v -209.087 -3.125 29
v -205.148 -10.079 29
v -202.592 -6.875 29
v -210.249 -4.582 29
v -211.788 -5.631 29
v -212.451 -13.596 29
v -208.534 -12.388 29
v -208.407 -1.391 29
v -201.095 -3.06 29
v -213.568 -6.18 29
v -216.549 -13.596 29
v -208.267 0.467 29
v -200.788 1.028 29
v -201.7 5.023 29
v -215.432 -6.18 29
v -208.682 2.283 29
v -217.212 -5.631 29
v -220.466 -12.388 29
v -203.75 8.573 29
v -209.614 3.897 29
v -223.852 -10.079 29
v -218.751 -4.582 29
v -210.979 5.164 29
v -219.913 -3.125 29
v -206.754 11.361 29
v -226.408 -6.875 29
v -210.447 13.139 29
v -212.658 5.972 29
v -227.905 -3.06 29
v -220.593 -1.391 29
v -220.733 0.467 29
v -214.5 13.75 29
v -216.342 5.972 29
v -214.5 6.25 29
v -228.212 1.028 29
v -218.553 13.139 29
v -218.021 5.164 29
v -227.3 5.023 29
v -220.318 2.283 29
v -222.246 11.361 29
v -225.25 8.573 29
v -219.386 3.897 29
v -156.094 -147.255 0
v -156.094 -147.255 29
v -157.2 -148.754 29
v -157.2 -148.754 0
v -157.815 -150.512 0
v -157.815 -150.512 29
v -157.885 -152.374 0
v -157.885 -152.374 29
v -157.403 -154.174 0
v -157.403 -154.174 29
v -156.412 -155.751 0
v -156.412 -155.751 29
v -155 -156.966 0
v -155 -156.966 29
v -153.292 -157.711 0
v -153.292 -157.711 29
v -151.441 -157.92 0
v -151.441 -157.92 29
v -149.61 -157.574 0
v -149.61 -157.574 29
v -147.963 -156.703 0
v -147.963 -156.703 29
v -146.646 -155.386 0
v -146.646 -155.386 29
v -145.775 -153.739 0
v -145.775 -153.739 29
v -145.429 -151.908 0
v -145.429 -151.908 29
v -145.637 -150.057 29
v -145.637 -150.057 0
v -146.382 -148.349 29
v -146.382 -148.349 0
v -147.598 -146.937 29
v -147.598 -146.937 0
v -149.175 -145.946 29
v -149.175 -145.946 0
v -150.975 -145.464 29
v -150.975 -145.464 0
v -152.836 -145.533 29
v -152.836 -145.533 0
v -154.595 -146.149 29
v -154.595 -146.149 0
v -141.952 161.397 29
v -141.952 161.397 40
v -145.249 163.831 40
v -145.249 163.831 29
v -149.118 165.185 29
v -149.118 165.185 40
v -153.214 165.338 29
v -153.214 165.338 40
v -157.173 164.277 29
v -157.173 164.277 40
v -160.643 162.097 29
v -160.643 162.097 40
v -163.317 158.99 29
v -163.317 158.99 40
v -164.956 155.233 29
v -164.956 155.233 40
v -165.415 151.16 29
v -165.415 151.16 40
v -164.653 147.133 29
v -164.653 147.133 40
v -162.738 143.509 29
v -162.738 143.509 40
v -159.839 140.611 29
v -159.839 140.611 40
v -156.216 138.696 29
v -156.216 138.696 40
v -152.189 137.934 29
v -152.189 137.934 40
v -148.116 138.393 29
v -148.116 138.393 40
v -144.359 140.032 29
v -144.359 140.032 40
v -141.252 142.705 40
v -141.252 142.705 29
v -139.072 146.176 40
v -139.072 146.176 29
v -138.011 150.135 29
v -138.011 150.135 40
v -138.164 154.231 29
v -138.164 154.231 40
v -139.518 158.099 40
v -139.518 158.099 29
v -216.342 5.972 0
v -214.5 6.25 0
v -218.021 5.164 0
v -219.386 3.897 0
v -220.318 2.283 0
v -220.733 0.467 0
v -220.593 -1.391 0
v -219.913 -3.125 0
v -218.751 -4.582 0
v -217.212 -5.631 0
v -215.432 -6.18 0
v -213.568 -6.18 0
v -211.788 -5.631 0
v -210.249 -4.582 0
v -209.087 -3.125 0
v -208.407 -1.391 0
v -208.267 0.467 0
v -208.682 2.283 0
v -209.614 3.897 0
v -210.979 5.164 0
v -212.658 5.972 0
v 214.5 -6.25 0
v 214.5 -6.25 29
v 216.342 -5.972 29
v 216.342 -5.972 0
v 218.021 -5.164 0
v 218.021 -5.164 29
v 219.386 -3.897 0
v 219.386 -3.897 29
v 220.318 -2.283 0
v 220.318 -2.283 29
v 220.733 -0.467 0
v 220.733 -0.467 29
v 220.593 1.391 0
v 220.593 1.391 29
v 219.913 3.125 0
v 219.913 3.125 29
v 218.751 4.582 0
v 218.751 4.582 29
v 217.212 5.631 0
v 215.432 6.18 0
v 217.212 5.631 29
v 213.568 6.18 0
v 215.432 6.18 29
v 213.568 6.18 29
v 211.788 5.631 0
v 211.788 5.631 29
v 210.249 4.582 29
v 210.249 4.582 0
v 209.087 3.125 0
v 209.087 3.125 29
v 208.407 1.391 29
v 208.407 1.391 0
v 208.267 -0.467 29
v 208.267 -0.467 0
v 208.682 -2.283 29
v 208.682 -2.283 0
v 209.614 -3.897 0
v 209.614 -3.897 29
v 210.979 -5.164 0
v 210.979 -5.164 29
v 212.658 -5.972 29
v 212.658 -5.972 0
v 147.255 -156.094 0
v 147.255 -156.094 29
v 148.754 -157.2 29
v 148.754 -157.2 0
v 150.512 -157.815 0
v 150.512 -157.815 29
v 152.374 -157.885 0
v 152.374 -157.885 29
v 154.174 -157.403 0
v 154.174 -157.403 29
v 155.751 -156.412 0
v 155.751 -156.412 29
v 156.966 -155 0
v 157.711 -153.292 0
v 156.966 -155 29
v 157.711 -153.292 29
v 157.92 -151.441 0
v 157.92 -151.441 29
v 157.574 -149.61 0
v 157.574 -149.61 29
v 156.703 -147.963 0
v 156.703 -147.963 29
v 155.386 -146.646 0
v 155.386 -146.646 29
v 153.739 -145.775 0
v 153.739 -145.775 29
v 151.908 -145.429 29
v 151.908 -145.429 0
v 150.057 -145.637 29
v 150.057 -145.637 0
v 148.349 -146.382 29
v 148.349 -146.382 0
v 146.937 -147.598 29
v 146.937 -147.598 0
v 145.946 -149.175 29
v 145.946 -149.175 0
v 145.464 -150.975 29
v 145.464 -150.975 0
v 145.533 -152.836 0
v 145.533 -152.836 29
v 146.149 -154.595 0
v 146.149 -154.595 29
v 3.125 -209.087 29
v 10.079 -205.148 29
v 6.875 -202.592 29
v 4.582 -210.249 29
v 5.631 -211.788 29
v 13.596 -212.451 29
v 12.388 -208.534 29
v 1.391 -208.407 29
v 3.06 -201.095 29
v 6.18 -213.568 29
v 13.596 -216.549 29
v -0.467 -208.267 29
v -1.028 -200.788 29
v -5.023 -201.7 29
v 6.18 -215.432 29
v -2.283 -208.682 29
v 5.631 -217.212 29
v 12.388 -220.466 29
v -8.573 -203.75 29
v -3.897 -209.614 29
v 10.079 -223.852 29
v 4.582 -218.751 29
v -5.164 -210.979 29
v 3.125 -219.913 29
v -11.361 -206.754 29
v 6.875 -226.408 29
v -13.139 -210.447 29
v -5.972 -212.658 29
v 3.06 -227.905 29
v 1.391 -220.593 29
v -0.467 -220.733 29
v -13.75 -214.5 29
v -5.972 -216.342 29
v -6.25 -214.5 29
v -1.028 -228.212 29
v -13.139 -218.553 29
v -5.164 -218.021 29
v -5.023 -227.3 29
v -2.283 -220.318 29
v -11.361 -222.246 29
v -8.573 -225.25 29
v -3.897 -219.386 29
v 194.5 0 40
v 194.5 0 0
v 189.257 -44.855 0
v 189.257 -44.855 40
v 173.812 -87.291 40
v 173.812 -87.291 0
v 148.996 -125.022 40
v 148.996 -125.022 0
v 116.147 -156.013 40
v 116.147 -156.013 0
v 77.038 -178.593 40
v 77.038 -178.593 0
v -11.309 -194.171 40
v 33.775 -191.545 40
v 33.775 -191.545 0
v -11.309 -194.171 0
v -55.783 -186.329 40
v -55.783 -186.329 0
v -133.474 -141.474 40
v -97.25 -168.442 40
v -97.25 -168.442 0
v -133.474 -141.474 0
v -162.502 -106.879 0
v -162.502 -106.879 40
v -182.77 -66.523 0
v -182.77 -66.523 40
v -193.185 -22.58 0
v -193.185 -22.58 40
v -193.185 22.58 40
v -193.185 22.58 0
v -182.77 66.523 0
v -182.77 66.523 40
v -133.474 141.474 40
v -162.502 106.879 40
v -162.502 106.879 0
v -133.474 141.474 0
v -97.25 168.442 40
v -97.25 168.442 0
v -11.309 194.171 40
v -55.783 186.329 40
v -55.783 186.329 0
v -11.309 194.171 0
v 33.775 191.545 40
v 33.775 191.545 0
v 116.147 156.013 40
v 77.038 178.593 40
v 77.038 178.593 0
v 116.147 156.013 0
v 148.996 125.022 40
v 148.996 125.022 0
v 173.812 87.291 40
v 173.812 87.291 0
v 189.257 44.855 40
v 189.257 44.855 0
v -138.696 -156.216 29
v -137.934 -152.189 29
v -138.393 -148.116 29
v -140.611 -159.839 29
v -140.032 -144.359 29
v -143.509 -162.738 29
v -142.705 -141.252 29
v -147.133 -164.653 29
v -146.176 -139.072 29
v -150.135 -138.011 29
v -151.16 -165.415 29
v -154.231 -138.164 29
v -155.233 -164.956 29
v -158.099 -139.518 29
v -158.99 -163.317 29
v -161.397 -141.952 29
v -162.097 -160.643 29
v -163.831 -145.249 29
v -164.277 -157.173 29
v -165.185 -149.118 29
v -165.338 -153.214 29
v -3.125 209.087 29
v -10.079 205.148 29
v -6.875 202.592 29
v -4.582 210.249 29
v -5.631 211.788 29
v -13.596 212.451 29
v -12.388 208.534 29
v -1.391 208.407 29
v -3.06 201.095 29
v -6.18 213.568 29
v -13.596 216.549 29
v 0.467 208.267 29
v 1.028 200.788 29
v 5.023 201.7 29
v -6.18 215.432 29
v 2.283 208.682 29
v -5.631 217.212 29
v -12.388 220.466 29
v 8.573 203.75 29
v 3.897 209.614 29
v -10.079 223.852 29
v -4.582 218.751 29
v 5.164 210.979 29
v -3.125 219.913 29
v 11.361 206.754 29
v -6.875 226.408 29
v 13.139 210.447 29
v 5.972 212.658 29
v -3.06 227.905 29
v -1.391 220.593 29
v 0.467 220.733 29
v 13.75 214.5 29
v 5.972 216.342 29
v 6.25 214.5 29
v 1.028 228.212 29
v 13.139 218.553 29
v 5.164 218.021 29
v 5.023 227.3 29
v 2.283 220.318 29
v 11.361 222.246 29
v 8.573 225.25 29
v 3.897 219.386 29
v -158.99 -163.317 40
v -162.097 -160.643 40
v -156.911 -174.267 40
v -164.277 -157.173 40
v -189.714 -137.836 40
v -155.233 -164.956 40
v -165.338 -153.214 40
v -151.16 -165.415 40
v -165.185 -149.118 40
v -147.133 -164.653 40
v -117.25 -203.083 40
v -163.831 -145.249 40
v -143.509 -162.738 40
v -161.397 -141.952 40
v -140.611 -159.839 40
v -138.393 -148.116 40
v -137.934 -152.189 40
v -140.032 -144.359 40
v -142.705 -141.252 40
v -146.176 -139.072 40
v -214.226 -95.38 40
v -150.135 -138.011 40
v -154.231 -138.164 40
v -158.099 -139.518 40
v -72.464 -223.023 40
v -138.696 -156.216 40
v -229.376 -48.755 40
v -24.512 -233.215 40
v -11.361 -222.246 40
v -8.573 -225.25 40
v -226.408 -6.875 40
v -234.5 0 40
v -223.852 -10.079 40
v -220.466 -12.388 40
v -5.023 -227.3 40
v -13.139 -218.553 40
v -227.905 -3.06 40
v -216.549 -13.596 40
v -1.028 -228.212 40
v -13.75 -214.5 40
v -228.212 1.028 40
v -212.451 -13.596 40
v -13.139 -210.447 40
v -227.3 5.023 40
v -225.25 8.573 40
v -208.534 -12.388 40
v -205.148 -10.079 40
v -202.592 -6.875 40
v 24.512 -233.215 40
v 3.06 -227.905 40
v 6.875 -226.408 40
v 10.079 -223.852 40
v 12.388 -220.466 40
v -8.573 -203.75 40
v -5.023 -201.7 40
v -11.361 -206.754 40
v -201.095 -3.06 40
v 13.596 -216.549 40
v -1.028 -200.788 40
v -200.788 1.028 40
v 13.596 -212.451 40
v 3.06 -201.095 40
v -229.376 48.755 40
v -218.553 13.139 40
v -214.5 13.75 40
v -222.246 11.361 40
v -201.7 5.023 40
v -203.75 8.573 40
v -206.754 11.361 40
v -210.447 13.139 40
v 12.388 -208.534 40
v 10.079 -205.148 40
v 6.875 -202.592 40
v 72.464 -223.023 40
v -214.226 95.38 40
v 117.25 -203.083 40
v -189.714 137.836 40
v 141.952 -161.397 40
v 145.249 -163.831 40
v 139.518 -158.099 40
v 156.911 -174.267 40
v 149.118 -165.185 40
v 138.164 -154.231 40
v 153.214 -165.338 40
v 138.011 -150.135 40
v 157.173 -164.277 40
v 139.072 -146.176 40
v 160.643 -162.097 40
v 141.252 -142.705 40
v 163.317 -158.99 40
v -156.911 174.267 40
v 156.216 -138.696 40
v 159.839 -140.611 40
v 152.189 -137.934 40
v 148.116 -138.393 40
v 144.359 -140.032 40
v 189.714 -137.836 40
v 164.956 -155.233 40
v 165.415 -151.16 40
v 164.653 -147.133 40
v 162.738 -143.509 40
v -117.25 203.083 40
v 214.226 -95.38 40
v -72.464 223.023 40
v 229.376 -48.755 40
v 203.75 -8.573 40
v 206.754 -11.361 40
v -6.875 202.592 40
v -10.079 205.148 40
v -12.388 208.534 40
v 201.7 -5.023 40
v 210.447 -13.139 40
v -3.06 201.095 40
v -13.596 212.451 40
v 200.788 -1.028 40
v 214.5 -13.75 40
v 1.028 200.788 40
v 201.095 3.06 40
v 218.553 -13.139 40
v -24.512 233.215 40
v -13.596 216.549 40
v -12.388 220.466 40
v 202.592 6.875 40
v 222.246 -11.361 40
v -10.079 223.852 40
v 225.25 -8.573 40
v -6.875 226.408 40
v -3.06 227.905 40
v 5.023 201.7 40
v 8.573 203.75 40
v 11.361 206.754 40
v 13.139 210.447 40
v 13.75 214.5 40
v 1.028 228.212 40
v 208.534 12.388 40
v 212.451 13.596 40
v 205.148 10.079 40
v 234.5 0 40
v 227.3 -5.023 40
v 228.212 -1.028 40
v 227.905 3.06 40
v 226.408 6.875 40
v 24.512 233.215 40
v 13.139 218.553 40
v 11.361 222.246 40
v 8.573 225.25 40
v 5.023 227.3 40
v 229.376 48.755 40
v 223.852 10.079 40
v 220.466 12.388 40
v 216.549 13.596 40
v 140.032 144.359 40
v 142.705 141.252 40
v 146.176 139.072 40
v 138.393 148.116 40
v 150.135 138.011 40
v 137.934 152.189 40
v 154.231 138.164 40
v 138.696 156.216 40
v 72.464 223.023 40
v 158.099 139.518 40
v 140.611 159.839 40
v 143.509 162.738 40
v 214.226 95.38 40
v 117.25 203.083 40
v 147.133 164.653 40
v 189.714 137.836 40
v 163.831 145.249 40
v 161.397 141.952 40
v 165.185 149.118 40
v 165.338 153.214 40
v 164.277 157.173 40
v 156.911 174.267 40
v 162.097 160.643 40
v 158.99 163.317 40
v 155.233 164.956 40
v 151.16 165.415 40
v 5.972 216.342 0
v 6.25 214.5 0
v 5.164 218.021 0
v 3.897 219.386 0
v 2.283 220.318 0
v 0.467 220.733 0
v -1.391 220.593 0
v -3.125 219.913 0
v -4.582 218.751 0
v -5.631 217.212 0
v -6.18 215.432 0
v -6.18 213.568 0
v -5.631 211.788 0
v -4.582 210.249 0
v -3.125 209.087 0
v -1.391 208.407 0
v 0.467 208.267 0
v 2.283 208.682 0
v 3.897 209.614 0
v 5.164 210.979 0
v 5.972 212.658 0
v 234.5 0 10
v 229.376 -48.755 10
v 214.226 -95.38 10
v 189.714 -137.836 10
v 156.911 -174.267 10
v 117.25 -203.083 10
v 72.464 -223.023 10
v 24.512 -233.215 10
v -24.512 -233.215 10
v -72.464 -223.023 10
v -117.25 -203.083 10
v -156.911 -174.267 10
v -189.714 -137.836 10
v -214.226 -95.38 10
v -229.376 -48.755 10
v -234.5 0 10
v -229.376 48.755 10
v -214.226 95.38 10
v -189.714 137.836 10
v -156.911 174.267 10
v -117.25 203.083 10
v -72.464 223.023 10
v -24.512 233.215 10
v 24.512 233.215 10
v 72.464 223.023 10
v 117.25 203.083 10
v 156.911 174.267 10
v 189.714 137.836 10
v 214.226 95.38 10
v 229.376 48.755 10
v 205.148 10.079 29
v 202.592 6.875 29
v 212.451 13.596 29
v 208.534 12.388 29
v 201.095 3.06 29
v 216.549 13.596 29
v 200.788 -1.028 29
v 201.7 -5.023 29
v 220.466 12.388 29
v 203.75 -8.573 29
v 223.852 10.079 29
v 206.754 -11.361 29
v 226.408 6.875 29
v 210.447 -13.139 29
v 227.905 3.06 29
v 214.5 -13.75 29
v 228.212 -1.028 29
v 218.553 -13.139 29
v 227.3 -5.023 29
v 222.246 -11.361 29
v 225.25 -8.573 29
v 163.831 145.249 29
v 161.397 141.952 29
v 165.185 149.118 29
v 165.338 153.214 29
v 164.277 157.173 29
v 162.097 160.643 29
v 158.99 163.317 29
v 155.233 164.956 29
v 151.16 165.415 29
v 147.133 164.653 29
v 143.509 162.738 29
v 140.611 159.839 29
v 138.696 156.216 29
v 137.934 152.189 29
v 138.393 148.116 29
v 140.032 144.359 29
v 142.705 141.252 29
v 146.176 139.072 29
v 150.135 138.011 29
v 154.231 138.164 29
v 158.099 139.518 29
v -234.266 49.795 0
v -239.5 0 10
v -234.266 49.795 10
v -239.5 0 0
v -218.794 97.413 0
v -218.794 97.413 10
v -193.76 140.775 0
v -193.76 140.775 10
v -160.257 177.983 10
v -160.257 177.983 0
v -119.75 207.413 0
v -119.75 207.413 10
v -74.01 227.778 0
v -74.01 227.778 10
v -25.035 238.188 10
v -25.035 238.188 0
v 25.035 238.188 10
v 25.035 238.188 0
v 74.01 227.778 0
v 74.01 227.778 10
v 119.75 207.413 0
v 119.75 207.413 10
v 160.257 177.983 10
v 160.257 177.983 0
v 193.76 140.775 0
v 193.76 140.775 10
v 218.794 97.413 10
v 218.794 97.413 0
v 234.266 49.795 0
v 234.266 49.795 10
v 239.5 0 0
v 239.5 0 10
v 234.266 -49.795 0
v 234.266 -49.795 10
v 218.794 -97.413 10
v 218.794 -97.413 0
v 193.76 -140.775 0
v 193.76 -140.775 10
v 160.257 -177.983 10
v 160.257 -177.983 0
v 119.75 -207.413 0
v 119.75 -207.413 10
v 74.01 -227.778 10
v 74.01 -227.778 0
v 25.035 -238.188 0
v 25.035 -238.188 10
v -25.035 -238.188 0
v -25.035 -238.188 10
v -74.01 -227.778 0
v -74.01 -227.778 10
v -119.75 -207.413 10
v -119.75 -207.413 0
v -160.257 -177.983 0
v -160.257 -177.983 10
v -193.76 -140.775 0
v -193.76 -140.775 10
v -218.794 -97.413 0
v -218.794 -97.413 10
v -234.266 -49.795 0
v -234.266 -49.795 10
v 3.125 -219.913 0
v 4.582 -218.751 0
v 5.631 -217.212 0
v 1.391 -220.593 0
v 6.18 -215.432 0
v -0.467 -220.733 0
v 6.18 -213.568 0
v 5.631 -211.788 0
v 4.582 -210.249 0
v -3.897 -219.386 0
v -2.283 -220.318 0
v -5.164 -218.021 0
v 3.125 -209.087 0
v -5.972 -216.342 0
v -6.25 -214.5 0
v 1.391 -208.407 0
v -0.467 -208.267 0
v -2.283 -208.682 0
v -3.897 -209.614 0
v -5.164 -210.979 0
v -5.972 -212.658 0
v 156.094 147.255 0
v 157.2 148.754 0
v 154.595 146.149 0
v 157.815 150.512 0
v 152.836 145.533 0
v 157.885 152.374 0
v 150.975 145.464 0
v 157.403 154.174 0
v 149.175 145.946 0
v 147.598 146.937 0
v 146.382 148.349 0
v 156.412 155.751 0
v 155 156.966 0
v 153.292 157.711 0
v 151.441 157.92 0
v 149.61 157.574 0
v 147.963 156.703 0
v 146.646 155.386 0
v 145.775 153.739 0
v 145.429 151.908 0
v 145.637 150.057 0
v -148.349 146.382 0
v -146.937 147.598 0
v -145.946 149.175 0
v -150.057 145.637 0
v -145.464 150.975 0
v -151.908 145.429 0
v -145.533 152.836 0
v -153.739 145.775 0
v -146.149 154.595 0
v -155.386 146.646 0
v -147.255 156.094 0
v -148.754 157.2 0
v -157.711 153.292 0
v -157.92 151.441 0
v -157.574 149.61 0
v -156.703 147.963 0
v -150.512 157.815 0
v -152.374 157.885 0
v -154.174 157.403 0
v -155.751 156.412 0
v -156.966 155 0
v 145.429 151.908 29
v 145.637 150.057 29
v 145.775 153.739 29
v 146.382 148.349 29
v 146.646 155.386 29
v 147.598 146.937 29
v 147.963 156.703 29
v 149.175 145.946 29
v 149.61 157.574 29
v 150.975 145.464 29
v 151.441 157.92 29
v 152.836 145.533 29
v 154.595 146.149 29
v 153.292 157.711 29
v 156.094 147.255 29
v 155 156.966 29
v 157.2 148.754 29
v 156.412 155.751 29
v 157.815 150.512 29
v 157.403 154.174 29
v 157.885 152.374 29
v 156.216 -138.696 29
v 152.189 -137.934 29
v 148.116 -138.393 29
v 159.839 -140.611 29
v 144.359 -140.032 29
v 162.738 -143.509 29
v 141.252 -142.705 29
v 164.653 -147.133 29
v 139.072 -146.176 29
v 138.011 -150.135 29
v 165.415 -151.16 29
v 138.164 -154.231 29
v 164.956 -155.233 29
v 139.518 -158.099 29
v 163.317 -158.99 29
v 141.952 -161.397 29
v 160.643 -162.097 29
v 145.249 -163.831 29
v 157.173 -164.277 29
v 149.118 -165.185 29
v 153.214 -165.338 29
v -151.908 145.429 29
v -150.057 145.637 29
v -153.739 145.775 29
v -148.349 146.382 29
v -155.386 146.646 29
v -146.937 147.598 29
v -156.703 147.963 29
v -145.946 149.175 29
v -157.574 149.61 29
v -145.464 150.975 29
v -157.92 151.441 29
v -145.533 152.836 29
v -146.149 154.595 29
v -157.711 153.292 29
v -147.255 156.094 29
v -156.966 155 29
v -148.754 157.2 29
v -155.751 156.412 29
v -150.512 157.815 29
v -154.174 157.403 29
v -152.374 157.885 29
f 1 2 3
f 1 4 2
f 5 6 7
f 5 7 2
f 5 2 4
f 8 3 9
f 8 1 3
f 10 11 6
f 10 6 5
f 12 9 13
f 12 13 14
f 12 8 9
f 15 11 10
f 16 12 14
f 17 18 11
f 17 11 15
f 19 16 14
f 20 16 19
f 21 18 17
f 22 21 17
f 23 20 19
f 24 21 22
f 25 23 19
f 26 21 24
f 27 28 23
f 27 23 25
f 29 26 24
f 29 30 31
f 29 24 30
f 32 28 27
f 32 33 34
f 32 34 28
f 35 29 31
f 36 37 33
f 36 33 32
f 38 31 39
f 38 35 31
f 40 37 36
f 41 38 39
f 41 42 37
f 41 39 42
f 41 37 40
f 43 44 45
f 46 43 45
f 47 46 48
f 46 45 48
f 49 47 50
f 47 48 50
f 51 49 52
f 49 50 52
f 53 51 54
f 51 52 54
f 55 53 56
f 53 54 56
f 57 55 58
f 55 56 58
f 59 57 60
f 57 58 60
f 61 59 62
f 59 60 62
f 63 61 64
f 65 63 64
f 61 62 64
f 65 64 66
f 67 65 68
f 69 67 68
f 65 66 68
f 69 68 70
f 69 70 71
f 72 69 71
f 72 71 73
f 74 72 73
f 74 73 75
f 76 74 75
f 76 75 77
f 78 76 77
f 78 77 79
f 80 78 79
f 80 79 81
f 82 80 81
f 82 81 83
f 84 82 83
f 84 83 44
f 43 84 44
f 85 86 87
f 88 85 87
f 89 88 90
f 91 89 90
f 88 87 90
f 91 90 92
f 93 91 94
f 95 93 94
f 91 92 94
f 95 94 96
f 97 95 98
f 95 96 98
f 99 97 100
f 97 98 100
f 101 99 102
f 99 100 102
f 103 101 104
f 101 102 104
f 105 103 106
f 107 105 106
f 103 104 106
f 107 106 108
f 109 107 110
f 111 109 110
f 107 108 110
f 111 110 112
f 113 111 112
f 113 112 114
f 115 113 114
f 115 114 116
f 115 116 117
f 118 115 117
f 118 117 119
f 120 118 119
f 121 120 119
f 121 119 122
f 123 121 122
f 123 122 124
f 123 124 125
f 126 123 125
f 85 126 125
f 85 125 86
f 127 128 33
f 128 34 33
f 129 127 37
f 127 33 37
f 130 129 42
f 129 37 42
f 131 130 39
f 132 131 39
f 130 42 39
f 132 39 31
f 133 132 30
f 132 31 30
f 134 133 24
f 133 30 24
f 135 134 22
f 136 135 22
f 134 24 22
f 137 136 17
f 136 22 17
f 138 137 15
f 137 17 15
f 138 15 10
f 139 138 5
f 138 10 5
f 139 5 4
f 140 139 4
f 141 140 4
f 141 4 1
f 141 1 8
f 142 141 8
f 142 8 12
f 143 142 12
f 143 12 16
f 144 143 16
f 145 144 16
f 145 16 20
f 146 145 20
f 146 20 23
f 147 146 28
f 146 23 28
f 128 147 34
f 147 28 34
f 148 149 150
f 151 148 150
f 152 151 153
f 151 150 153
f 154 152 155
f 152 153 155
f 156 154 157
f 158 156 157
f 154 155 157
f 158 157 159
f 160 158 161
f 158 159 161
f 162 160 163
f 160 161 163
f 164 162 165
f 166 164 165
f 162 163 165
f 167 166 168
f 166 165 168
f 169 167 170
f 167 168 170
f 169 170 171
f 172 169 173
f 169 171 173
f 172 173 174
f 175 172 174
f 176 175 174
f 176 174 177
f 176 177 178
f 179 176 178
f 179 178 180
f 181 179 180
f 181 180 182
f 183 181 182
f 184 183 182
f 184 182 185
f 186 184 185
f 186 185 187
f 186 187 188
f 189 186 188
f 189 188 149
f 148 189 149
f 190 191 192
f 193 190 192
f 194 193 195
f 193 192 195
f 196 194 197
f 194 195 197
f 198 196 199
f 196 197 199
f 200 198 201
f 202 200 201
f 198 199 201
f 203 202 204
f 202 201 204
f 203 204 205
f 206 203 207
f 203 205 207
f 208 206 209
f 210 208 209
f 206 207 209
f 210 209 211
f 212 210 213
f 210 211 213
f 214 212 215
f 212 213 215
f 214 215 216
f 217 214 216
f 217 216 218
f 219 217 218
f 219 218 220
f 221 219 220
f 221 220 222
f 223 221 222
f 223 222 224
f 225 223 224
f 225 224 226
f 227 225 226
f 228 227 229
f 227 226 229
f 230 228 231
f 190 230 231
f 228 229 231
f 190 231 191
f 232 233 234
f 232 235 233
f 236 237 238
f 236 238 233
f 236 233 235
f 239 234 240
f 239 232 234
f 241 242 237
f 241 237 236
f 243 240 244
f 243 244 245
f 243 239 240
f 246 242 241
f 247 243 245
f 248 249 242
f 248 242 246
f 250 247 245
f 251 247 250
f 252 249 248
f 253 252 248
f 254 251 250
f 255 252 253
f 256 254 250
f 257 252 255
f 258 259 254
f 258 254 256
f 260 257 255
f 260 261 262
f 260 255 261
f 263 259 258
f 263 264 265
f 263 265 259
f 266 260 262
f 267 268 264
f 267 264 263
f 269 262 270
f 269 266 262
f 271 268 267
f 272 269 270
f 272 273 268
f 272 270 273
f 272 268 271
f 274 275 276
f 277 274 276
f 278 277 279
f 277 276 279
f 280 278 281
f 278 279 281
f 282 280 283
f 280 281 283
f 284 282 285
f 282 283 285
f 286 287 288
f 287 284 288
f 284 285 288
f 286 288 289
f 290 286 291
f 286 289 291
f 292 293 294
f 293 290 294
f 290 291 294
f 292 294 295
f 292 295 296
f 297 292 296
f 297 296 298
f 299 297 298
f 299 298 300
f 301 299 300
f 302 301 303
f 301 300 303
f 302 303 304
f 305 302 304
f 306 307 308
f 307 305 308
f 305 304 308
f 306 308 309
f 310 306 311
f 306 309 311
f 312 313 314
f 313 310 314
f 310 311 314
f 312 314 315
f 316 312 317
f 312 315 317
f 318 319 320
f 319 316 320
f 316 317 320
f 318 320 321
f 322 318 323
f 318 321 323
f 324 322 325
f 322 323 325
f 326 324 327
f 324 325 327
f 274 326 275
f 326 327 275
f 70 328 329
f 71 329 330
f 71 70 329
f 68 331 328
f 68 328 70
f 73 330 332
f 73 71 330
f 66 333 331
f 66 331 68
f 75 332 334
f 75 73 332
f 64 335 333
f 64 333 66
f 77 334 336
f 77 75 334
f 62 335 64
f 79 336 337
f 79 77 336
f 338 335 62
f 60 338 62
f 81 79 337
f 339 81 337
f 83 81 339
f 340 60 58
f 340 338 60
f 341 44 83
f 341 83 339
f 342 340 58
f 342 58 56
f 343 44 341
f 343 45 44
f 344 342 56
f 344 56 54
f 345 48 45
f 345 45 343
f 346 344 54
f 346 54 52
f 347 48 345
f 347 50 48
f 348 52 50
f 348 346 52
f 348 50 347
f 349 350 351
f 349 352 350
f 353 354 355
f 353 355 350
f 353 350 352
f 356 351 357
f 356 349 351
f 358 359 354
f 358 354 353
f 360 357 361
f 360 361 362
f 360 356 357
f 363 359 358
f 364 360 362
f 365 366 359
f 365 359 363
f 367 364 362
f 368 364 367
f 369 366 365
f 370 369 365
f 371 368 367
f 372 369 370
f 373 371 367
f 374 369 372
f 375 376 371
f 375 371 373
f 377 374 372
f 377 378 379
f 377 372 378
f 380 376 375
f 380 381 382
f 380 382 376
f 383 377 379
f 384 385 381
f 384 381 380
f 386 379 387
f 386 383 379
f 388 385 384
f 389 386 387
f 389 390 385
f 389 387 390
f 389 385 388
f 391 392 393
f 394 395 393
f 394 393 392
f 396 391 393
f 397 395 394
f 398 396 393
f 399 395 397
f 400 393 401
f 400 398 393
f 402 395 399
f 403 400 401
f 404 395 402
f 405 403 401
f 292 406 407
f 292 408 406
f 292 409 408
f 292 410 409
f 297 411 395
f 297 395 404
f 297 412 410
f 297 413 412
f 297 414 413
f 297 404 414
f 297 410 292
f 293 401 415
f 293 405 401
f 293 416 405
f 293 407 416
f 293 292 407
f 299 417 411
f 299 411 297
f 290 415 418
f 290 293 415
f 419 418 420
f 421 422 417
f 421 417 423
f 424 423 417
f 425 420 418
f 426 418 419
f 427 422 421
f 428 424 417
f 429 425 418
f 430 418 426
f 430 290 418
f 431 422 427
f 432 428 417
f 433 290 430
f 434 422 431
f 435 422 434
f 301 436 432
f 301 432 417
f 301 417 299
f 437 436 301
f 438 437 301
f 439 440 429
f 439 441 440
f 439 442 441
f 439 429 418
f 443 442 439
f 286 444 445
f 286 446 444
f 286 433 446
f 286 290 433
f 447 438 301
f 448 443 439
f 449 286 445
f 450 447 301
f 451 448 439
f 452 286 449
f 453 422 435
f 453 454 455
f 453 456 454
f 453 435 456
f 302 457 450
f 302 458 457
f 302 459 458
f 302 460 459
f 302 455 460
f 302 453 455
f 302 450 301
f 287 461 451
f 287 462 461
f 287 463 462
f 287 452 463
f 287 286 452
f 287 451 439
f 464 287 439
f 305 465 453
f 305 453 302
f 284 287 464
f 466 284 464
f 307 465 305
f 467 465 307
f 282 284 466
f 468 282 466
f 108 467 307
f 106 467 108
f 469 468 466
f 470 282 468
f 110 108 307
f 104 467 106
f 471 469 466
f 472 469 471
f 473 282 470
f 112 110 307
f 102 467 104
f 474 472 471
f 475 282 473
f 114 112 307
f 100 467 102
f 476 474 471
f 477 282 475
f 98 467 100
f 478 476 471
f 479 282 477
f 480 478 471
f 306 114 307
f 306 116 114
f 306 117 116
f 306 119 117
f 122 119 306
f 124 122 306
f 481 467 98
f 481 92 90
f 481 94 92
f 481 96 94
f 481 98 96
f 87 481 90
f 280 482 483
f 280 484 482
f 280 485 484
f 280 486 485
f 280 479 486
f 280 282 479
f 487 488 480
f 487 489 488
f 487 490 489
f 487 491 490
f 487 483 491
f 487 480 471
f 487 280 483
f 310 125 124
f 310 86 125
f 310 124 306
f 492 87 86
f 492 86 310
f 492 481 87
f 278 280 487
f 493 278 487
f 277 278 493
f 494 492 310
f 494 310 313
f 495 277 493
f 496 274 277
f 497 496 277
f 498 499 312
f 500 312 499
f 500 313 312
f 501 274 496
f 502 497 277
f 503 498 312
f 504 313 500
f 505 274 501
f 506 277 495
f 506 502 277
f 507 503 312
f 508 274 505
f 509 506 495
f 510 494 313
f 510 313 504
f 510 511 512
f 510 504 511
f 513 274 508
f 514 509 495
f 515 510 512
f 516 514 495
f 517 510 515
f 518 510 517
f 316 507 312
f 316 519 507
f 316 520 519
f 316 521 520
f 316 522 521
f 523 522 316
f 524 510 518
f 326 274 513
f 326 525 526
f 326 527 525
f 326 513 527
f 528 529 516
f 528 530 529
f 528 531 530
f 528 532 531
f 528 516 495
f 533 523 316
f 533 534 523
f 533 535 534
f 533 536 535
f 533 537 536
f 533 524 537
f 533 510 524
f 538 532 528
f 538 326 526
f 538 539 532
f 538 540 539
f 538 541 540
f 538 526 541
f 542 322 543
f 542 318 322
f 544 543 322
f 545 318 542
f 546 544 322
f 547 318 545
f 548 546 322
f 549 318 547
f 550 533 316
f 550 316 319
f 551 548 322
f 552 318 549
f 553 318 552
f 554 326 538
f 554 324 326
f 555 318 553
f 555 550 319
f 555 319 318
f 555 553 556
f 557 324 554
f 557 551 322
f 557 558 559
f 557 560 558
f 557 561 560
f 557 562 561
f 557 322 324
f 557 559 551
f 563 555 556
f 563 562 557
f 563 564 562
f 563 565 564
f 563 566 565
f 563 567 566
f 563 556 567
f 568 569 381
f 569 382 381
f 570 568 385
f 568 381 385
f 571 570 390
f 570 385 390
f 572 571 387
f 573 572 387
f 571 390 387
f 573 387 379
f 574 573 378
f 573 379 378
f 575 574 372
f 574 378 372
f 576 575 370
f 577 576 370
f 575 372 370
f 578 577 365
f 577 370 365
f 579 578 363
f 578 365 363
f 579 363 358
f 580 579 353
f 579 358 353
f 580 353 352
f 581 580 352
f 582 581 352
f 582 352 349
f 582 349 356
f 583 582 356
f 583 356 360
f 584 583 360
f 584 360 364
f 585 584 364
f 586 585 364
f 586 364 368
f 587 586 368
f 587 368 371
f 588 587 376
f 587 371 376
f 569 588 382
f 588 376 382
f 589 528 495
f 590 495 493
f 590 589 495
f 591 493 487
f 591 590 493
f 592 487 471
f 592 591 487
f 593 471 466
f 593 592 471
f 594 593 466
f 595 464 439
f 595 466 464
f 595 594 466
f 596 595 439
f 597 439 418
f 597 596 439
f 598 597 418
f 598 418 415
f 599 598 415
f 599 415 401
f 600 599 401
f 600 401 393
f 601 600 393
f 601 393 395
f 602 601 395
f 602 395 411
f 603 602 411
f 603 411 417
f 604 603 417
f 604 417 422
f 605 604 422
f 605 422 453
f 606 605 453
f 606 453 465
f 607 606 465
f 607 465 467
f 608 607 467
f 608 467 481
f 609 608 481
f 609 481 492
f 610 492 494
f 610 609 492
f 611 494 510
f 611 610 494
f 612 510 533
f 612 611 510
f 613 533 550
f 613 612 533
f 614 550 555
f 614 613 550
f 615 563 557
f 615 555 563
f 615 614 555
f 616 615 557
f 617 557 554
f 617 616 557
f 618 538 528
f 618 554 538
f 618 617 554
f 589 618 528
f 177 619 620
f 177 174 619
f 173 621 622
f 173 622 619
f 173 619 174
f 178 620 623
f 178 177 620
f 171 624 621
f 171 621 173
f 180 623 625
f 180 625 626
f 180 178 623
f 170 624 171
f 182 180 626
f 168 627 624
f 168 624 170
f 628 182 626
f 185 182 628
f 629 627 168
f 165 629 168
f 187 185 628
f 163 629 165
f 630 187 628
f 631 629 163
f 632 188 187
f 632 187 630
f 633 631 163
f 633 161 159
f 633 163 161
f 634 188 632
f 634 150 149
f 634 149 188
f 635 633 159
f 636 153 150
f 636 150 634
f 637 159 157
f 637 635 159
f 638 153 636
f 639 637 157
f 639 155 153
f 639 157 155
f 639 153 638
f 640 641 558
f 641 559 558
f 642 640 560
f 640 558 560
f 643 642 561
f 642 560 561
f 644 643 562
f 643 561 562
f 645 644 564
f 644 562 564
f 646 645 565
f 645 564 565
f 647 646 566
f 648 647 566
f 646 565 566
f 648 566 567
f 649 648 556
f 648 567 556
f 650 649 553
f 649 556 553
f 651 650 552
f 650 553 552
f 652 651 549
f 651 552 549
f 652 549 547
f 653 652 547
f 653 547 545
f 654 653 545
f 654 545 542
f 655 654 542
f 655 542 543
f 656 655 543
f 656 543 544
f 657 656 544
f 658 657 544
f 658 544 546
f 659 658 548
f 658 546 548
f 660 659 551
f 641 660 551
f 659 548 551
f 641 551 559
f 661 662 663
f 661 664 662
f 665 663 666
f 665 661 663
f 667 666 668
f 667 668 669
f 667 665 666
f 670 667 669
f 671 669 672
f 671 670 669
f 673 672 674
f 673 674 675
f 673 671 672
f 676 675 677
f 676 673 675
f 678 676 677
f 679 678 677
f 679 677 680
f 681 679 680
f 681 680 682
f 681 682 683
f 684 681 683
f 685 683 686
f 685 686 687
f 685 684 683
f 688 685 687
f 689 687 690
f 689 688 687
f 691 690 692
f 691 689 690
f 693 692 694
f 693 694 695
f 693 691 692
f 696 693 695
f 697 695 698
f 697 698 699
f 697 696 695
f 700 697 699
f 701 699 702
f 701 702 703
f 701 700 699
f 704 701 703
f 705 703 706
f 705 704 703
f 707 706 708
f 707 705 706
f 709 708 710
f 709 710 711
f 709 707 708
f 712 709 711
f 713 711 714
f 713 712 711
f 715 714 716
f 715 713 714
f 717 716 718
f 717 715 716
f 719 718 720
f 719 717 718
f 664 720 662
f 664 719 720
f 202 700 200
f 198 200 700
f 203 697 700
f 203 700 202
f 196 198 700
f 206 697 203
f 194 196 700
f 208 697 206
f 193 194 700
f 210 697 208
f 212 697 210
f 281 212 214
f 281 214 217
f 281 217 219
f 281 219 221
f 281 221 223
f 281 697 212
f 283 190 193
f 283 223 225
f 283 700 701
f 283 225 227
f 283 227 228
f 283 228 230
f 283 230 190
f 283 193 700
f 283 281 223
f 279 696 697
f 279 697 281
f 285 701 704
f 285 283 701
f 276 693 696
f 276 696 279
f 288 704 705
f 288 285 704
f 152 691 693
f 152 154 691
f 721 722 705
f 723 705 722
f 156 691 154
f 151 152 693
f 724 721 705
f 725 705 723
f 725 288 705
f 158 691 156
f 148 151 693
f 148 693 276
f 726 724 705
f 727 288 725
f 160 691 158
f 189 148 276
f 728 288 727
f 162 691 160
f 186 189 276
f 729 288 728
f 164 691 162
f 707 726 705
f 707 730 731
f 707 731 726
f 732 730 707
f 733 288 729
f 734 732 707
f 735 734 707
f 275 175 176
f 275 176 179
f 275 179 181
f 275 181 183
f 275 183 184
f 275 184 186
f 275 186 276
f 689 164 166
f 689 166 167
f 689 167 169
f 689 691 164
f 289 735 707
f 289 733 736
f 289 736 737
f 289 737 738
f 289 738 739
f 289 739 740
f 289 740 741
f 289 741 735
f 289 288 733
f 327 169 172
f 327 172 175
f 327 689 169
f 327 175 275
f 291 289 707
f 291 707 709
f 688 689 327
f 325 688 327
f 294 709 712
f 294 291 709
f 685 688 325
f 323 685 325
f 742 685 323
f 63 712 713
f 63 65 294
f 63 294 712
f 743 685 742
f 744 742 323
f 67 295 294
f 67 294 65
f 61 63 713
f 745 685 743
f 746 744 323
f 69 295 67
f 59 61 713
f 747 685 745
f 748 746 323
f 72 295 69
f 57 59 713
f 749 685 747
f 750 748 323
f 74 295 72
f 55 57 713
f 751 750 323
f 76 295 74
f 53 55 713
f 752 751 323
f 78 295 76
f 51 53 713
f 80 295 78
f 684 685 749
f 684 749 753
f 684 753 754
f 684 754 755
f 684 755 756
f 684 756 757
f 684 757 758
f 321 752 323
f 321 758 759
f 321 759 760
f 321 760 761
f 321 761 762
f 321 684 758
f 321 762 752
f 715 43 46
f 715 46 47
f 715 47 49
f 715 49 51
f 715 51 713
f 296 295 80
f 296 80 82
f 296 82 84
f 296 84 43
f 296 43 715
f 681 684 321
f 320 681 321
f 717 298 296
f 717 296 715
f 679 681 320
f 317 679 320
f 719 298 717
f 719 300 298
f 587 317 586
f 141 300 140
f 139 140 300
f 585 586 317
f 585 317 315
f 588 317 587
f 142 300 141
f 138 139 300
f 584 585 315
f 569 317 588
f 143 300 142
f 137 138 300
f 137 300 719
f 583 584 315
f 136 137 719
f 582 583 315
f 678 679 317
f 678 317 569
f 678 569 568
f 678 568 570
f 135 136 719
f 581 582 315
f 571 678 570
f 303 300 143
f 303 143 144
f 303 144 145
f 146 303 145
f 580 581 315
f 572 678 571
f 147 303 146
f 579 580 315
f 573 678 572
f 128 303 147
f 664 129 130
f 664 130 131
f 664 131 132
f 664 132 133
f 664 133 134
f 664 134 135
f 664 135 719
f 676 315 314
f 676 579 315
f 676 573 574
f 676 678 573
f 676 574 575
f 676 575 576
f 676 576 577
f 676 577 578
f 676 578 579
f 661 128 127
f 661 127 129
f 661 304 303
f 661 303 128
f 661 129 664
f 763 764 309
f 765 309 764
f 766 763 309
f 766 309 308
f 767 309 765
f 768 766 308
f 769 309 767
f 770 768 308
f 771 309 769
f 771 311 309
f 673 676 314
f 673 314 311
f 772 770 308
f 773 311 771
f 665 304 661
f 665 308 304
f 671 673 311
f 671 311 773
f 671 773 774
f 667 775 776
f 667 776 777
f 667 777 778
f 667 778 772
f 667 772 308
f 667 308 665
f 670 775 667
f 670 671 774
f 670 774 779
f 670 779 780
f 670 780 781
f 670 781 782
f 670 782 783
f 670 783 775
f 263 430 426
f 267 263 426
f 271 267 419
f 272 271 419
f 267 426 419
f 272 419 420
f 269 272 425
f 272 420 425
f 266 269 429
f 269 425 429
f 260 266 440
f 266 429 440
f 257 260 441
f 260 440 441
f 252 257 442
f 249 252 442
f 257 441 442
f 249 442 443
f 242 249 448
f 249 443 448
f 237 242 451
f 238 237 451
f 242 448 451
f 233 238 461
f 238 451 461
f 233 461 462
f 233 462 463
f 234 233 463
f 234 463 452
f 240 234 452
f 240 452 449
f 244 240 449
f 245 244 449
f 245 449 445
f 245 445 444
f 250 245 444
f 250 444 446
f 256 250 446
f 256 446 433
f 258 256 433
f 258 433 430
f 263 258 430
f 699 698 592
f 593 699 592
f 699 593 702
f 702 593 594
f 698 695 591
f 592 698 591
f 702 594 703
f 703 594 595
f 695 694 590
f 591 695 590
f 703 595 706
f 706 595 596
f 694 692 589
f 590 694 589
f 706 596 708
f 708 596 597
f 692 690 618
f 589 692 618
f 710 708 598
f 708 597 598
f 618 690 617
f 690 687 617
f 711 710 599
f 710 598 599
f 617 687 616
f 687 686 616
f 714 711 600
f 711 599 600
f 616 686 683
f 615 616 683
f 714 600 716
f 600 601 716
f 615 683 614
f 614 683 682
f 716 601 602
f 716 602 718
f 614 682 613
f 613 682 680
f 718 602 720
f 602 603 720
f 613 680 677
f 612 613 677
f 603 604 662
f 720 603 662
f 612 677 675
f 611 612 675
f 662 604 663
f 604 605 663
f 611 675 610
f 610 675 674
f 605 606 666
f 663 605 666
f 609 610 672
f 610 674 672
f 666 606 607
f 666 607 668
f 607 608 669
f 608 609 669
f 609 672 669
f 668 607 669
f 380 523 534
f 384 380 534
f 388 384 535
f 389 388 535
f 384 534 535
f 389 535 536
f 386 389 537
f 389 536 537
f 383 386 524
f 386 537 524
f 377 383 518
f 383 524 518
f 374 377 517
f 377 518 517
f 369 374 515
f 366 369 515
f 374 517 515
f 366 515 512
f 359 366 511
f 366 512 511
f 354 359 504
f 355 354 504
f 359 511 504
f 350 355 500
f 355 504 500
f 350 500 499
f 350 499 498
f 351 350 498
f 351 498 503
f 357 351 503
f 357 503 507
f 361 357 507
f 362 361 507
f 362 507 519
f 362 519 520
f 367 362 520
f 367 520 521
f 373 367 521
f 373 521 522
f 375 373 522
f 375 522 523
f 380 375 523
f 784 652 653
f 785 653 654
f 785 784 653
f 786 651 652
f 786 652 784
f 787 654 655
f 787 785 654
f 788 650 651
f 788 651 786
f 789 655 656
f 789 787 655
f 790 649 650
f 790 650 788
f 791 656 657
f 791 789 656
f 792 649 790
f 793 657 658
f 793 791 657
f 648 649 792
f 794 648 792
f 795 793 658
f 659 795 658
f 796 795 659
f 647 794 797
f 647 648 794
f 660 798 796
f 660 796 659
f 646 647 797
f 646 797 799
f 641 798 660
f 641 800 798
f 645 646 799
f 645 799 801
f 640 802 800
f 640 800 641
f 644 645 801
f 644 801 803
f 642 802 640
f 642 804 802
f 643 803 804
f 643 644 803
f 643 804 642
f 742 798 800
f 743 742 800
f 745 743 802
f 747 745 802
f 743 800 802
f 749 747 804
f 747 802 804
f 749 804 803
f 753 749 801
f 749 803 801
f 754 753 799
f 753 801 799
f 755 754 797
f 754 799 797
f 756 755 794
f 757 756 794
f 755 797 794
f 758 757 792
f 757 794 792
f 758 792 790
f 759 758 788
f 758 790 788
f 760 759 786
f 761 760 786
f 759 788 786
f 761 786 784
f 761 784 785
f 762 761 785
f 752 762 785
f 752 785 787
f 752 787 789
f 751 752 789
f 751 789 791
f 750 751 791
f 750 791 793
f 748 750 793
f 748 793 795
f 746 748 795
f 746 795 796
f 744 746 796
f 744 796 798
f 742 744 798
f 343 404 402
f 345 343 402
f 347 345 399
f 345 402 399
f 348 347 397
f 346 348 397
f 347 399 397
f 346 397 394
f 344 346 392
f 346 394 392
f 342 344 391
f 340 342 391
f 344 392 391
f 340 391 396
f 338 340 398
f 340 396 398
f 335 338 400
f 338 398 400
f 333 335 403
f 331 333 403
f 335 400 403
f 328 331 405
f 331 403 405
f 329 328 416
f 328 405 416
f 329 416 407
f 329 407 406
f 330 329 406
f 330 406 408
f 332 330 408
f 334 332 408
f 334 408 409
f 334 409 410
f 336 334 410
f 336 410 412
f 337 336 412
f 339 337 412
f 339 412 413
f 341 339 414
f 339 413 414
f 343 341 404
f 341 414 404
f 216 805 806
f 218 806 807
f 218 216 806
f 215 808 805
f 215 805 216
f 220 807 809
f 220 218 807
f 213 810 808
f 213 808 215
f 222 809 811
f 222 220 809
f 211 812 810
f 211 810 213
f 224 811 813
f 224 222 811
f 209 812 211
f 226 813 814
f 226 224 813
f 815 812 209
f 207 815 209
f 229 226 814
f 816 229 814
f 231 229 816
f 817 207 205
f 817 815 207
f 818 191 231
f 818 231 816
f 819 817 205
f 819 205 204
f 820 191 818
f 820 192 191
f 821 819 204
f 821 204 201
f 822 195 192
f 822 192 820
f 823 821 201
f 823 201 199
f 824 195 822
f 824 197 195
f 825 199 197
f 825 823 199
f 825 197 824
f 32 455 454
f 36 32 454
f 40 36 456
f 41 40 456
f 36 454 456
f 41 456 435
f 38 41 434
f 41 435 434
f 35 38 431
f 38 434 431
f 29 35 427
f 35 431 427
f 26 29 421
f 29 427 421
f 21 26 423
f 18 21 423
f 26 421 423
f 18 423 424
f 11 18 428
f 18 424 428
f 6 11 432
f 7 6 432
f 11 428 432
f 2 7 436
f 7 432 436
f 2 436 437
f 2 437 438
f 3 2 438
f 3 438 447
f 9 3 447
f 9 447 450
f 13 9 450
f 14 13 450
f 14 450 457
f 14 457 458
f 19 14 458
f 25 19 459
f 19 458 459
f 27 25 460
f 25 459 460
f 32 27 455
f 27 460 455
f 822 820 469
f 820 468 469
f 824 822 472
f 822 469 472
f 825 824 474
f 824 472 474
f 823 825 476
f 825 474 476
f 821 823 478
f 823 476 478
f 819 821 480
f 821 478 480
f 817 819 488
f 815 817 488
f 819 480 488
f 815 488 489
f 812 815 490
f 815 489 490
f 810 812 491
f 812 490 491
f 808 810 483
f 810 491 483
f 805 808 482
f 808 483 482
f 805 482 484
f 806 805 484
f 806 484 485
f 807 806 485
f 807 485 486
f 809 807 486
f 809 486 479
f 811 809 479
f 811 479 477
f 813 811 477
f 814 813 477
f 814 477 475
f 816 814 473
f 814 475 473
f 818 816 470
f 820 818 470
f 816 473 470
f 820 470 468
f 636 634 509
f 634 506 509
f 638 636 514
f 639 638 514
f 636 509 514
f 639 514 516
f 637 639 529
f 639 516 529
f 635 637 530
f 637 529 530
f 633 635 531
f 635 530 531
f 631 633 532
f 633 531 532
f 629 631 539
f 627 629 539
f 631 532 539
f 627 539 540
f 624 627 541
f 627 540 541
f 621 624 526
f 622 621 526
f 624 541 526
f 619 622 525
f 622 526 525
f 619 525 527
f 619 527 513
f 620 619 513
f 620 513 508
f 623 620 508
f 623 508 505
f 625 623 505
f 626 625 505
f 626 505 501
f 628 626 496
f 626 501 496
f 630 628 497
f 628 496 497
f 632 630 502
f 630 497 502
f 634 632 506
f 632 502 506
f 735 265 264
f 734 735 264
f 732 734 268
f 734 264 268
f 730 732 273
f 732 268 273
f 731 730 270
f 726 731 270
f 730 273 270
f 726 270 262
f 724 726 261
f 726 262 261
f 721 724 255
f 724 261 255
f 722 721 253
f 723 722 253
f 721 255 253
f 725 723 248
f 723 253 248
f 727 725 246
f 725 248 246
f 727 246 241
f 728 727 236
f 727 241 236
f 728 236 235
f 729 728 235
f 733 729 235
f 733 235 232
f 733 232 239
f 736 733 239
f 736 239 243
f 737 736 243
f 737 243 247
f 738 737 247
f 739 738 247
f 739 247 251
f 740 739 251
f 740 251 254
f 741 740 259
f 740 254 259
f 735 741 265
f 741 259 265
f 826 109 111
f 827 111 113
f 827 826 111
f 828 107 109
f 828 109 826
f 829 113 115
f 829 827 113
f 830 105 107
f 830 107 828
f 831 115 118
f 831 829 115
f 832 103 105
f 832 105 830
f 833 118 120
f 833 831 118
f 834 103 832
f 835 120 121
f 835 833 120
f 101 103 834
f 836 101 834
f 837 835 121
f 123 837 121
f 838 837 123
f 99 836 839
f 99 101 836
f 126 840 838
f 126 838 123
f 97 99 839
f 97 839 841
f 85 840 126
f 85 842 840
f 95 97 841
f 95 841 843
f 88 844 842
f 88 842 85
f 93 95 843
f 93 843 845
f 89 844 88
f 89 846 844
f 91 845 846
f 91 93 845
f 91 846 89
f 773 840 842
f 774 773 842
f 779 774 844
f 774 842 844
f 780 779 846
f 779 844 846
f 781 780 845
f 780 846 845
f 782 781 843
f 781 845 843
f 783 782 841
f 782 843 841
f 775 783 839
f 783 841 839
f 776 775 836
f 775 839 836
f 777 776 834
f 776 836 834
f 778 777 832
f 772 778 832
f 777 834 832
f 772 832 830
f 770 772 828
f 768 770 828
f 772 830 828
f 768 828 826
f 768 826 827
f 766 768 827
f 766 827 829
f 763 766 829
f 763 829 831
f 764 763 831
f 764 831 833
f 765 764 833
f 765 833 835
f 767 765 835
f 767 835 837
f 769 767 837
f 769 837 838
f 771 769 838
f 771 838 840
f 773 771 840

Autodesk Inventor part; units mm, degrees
ref_plane "YZ Plane" through (0, 0, 0) normal (1, 0, 0) x (0, 1, 0)
ref_plane "XZ Plane" through (0, 0, 0) normal (0, 1, 0) x (-1, 0, 0)
ref_plane "XY Plane" through (0, 0, 0) normal (0, 0, 1) x (1, 0, 0)
sketch "Sketch1" plane through (0, 0, 0) normal (0, 0, 1) x (1, 0, 0)
  circle A0 centre (0, 0) radius 194.5
  circle A1 centre (0, 0) radius 234.5
  dimension "d0" = 40
  dimension "d1" = 389
extrude "Extrusion1" add sketch "Sketch1" along normal blind 40
sketch "Sketch2" plane through (0, 0, 40) normal (0, 0, 1) x (1, 0, 0)
  circle A0 centre (0, 0) radius 234.5 construction
  circle A1 centre (0, 0) radius 194.5 construction
  line L0 (0, 234.5) -> (0, 194.5) construction
  circle A2 centre (0, 214.5) radius 6.25
  dimension "d4" = 12.5
extrude "Extrusion2" cut sketch "Sketch2" against normal through all
sketch "Sketch3" plane through (0, 0, 40) normal (0, 0, 1) x (1, 0, 0)
  circle A0 centre (0, 214.5) radius 6.25 projected
  circle A1 centre (0, 214.5) radius 13.75
  point P0 (0, 0)
  dimension "d10" = 27.5
extrude "Extrusion3" cut sketch "Sketch3" against normal blind 11
pattern_circular "Circular Pattern1" count 8 over 360 about axis through (0, 0, 0) along (0, 0, 1) of "Extrusion2", "Extrusion3"
sketch "Sketch4" plane through (0, 0, 0) normal (0, 0, -1) x (-1, 0, 0)
  circle A0 centre (0, 0) radius 234.5 projected
  circle A1 centre (0, 0) radius 239.5
  dimension "d13" = 5
extrude "Extrusion4" add sketch "Sketch4" against normal blind 10
equation "\"d1\" = Вал_ось_диаметр_КОРМА"
equation "\"d2\" = Барабан_толщина_посад_кольца"
equation "\"Вал_ось_диаметр_КОРМА\" = 389"
equation "\"Барабан_толщина_посад_кольца\" = 40"
properties part number "ДМФ 01 32 Барабан Опорное кольцо КОРМА"
